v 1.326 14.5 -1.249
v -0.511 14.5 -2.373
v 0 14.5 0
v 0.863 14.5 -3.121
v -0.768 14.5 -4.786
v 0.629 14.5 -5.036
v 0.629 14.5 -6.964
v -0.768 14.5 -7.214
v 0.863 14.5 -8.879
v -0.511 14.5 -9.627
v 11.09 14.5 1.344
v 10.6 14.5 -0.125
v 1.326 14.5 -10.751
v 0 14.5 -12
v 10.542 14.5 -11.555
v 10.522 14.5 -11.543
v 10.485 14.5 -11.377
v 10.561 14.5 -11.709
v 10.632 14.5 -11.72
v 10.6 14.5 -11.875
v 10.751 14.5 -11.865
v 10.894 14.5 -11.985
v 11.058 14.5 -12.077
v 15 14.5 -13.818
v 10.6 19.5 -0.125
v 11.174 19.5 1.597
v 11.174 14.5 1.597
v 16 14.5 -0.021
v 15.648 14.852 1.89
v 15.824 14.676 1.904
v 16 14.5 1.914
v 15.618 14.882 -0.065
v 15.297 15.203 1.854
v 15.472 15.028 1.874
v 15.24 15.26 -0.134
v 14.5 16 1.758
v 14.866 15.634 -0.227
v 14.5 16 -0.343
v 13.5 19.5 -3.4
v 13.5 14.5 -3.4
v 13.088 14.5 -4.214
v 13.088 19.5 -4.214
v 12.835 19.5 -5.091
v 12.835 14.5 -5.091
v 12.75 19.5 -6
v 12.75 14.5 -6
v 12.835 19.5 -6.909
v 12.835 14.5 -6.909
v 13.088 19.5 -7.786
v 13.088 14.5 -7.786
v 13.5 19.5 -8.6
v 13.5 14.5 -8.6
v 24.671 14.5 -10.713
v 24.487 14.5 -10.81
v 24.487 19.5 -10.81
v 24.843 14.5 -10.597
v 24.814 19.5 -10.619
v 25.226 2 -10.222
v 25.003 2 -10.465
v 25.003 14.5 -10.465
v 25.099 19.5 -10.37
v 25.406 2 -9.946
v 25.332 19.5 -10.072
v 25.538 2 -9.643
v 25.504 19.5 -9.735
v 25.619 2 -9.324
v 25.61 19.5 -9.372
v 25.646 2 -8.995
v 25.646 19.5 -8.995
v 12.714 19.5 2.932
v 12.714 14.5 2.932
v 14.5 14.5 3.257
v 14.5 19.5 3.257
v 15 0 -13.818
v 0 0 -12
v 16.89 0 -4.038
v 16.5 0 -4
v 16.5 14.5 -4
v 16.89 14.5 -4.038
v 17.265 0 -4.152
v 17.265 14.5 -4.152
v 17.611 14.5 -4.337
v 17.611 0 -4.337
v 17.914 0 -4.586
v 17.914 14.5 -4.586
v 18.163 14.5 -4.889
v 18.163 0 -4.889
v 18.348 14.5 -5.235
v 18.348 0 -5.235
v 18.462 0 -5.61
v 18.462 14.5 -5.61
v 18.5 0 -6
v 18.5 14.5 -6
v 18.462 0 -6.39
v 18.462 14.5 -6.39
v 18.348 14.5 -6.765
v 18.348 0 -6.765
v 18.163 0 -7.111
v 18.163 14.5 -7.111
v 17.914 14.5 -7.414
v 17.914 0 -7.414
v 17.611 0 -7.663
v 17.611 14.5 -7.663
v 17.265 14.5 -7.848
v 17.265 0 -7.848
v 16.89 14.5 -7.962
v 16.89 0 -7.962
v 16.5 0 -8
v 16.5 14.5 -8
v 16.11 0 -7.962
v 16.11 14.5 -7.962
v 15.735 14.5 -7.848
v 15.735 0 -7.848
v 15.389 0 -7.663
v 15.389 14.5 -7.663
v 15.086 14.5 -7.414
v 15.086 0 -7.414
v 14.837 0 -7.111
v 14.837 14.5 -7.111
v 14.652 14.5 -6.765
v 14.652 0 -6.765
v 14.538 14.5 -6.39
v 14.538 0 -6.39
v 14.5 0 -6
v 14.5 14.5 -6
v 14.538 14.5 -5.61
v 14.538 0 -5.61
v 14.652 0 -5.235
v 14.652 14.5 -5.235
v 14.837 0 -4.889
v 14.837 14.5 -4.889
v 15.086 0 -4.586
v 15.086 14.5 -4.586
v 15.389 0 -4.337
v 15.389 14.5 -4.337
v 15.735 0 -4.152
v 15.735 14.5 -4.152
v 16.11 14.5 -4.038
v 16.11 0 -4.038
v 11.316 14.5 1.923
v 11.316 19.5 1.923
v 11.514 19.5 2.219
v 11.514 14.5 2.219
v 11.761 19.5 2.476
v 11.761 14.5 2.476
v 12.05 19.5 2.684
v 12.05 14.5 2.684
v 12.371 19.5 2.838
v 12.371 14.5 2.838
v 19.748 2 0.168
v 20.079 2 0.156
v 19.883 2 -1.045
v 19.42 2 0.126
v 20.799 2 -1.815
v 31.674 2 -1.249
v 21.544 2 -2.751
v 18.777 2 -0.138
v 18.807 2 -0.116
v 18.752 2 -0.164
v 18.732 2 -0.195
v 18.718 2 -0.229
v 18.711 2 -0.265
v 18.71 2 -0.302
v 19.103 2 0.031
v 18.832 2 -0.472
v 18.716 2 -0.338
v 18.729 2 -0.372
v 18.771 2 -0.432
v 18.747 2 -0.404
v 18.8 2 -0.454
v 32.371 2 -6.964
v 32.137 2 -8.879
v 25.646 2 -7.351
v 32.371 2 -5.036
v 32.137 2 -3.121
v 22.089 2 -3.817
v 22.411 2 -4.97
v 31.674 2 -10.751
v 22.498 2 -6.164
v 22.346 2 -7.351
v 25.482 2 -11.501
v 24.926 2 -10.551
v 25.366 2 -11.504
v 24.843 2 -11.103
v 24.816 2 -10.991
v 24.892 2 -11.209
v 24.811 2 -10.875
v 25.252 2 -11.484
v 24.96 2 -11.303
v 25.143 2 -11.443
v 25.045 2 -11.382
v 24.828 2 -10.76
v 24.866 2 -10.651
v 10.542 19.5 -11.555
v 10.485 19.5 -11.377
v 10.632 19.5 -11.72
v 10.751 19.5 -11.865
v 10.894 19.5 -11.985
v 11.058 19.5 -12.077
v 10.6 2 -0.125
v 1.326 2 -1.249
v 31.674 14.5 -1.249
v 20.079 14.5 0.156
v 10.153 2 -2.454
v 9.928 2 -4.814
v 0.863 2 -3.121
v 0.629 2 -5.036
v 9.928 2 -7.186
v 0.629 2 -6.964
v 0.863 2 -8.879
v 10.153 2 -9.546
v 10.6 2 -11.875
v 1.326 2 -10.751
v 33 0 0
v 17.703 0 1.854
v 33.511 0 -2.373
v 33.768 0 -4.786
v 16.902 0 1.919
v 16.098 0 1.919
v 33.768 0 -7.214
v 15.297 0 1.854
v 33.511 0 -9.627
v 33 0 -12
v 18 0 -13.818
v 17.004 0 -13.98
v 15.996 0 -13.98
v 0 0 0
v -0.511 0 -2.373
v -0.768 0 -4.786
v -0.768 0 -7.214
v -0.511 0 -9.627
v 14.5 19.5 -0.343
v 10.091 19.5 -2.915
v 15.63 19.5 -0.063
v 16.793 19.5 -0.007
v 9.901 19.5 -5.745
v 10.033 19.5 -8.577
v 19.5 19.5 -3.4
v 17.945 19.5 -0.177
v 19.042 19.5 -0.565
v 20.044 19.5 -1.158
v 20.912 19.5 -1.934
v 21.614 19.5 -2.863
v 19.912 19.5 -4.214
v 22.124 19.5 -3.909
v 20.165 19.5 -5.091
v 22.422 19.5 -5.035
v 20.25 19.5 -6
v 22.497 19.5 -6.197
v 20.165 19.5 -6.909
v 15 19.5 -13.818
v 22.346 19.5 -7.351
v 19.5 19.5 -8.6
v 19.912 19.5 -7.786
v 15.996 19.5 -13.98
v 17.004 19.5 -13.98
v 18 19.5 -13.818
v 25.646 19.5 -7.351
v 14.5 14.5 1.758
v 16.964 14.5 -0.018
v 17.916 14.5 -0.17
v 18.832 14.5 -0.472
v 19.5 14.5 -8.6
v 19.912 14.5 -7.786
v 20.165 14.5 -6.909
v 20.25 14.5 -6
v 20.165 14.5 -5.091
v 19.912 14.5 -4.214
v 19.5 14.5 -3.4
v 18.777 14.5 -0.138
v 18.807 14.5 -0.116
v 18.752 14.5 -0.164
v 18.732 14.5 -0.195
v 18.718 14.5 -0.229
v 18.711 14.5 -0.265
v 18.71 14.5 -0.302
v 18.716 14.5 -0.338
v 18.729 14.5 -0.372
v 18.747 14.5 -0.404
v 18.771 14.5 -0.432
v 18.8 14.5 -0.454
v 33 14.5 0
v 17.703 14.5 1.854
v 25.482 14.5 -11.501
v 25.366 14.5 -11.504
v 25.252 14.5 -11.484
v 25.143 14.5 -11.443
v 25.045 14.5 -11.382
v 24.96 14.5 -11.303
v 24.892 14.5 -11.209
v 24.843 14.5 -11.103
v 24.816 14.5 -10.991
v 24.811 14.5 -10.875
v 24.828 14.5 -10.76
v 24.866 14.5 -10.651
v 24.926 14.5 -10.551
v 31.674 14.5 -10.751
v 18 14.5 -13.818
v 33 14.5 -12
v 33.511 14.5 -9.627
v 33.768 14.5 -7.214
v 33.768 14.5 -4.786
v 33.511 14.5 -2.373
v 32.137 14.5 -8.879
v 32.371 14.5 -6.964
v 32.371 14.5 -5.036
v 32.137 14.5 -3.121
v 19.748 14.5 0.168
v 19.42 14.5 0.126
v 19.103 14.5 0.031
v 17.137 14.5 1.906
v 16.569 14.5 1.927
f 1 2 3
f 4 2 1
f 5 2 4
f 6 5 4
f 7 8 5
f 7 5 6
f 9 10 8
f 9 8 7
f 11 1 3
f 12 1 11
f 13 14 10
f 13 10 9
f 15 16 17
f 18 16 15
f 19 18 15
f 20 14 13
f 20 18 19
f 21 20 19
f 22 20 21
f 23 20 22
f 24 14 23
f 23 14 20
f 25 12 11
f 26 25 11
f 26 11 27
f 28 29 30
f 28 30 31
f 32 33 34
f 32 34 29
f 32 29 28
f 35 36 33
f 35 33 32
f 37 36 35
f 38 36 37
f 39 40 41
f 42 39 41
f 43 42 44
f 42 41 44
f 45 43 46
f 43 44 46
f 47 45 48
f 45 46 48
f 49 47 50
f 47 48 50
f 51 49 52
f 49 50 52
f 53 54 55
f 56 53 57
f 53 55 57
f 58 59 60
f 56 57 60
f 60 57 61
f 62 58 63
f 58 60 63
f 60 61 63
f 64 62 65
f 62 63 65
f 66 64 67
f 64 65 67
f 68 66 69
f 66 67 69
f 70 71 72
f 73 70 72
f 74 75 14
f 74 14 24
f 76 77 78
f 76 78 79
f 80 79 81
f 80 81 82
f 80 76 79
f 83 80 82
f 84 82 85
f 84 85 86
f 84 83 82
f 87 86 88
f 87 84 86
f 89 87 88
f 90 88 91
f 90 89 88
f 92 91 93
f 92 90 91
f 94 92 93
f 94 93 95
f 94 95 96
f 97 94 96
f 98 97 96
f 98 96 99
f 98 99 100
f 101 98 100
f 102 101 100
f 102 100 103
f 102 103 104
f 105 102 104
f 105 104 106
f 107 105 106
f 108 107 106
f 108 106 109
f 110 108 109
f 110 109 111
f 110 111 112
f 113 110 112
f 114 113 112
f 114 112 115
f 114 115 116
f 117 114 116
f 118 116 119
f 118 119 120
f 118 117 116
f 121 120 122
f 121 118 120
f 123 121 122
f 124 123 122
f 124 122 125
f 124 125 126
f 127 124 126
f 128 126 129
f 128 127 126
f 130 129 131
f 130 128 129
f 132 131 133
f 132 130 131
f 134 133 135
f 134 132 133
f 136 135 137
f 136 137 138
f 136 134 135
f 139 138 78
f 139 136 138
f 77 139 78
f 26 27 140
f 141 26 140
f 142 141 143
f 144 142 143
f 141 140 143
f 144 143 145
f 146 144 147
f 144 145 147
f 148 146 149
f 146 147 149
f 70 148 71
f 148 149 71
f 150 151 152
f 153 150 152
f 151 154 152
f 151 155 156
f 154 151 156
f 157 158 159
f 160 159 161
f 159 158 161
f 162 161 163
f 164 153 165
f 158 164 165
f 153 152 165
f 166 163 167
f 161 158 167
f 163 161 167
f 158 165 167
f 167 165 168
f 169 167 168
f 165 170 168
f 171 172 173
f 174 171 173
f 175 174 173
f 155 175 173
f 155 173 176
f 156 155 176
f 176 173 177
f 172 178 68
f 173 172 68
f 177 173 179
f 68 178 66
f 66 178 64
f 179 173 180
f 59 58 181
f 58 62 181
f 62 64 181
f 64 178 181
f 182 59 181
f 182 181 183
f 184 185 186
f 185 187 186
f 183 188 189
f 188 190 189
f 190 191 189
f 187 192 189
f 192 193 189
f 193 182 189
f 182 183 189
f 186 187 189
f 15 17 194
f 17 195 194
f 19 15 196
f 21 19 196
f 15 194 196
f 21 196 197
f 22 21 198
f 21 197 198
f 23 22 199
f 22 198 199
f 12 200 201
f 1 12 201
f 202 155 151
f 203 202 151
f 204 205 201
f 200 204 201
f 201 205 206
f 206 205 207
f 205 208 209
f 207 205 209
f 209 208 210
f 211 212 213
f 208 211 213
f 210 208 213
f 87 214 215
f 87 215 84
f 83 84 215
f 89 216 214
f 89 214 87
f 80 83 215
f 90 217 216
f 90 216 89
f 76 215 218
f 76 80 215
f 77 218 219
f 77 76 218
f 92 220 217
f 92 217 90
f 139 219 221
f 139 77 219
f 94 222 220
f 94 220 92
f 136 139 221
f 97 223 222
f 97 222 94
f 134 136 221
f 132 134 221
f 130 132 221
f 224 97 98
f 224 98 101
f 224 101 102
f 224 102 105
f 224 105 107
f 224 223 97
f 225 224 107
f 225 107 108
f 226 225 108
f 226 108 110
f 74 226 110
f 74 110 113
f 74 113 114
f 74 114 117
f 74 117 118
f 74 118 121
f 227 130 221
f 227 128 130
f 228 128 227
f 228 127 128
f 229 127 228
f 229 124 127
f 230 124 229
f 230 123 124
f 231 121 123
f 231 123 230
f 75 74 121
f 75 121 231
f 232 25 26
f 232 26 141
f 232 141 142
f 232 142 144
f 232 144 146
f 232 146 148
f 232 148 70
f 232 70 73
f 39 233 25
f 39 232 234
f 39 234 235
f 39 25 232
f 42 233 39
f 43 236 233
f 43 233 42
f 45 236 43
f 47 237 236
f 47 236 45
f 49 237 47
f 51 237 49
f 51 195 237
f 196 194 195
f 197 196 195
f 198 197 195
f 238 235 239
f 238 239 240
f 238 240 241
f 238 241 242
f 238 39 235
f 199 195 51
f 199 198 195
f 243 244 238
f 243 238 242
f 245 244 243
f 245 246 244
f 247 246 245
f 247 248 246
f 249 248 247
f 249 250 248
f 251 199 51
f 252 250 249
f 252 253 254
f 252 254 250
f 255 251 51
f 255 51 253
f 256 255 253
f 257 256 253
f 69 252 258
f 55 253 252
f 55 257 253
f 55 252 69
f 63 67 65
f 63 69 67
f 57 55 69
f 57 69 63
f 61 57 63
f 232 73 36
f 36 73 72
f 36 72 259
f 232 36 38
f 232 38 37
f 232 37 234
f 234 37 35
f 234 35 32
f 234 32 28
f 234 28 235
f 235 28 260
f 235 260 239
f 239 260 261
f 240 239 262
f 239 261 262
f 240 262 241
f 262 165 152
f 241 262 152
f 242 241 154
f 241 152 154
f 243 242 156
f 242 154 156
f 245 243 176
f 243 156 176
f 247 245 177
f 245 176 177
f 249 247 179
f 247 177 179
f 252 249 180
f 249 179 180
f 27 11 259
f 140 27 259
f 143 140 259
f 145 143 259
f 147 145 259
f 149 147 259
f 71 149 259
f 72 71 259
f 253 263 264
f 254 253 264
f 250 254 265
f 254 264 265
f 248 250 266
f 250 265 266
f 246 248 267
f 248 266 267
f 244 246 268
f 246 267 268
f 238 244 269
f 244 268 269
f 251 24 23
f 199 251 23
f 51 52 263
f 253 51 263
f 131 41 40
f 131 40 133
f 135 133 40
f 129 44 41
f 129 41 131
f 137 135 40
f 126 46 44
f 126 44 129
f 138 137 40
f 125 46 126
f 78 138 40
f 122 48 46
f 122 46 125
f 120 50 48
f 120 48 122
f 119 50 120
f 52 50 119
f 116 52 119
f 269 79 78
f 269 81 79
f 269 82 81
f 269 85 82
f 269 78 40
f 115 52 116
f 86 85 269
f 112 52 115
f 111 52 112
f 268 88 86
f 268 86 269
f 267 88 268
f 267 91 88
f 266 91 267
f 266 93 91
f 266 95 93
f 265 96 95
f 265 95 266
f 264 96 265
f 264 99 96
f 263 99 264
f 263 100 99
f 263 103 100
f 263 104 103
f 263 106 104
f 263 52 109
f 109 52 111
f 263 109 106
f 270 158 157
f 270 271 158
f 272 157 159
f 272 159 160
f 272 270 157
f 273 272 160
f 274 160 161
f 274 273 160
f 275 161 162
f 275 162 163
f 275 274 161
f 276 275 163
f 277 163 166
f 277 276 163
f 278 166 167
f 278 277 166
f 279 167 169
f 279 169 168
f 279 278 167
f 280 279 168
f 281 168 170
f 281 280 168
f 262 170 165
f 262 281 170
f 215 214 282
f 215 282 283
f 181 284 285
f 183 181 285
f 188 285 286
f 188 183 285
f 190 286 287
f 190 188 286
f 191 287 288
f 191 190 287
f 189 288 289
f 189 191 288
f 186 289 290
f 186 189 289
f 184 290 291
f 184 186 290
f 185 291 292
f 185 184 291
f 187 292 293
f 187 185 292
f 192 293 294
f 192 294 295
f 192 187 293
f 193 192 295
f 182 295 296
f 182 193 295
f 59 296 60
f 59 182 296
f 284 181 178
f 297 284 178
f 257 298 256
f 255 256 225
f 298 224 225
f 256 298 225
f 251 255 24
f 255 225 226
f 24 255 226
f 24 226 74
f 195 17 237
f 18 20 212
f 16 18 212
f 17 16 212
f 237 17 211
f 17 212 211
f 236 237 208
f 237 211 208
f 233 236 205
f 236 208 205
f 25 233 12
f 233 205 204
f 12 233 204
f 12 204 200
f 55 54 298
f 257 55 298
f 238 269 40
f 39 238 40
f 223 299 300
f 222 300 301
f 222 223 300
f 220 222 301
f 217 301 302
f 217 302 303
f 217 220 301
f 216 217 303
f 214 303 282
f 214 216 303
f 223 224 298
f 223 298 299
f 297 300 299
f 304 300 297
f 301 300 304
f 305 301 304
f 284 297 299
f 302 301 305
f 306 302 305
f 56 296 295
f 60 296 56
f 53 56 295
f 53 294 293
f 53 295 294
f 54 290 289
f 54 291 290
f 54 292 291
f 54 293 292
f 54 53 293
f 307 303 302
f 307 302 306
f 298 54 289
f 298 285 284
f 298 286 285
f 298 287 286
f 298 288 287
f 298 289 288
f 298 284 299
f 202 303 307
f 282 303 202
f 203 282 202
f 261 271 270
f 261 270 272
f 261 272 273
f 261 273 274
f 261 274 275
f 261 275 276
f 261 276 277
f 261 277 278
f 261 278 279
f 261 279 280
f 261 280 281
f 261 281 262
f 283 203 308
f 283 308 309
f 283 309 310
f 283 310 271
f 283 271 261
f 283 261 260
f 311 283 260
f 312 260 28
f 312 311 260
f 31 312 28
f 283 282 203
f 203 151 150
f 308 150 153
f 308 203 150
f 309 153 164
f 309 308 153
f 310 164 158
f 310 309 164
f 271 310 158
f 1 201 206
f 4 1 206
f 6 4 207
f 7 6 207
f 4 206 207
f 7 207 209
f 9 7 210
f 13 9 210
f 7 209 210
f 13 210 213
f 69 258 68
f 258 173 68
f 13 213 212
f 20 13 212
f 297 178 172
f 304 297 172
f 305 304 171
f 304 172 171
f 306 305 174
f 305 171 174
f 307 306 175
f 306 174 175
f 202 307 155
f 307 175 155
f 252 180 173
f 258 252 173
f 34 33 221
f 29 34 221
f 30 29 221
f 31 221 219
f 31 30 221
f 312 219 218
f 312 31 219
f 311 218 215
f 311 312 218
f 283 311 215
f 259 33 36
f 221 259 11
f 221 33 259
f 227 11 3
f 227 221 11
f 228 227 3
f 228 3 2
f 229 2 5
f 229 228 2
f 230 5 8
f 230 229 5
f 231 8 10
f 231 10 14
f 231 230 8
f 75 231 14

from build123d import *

# Parameters (mm, degrees)
BOSS_EXTRUDE1_DEPTH = 14.5
SKETCH1_3_R         = 1.9999999999999996
BOSS_EXTRUDE2_DEPTH = 2
SKETCH2_R           = 1.9999999999999996
BOSS_EXTRUDE3_DEPTH = 12.5
BOSS_EXTRUDE4_START = -2
SKETCH2_2_R         = 1.9999999999999996
BOSS_EXTRUDE4_DEPTH = 2
BOSS_EXTRUDE5_DEPTH = 5
CHAMFER1_SIZE       = 1.5
FILLET3_R           = 2
FILLET1_R           = 0.6
FILLET4_R           = 2
FILLET5_R           = 0.2
FILLET6_R           = 1
FILLET7_R           = 10


with BuildPart() as part:
    # Sketch1 → Boss-Extrude1 (new body)
    with BuildSketch(Plane(origin=(0, 0, 0), x_dir=(1, 0, 0), z_dir=(0, 1, 0))):
        with BuildLine():
            ThreePointArc((33, 12), (33.8, 6), (33, 0))
            Line((33, 0), (16.499999999999837, -2.00000000000002))
            Line((16.499999999999837, -2.00000000000002), (0, 0))
            ThreePointArc((0, 0), (-0.7999999999999936, 5.999999999999997), (0, 12))
            Line((0, 12), (16.499999999999837, 13.99999999999998))
            Line((16.499999999999837, 13.99999999999998), (33, 12))
        make_face()
        with BuildLine():
            Line((16.49999999999997, 12.589752836725182), (31.673748690170243, 10.750510571250008))
            ThreePointArc((31.673748690170243, 10.750510571250008), (32.39999999999999, 5.999999999999953), (31.673748690170243, 1.2494894287498812))
            Line((31.673748690170243, 1.2494894287498812), (16.49999999999984, -0.5897528367253209))
            Line((16.49999999999984, -0.5897528367253209), (1.3262513098297308, 1.2494894287498826))
            ThreePointArc((1.3262513098297308, 1.2494894287498826), (0.5999999999999286, 5.999999999999944), (1.3262513098297308, 10.750510571250004))
            Line((1.3262513098297308, 10.750510571250004), (16.49999999999997, 12.589752836725182))
        make_face(mode=Mode.SUBTRACT)
    extrude(amount=BOSS_EXTRUDE1_DEPTH)

    # Sketch1<3> → Boss-Extrude2 (add)
    with BuildSketch(Plane(origin=(0, 0, 0), x_dir=(1, 0, 0), z_dir=(0, 1, 0))):
        with BuildLine():
            ThreePointArc((31.673748690170243, 10.750510571250008), (32.39999999999999, 5.999999999999953), (31.673748690170243, 1.2494894287498812))
            Line((31.673748690170243, 1.2494894287498812), (16.49999999999984, -0.5897528367253209))
            Line((16.49999999999984, -0.5897528367253209), (1.3262513098297308, 1.2494894287498826))
            ThreePointArc((1.3262513098297308, 1.2494894287498826), (0.5999999999999286, 5.999999999999944), (1.3262513098297308, 10.750510571250004))
            Line((1.3262513098297308, 10.750510571250004), (16.49999999999997, 12.589752836725182))
            Line((16.49999999999997, 12.589752836725182), (31.673748690170243, 10.750510571250008))
        make_face()
        with Locations(Location((16.499999999999837, 5.999999999999998, 0), (0, 0, 270))):
            Circle(SKETCH1_3_R, mode=Mode.SUBTRACT)
    extrude(amount=BOSS_EXTRUDE2_DEPTH)

    # Sketch2 → Boss-Extrude3 (add)
    with BuildSketch(Plane(origin=(0, 2, 0), x_dir=(1, 0, 0), z_dir=(0, 1, 0))):
        with BuildLine():
            Line((22.34588668015035, 7.351150962268389), (25.64588668015035, 7.351150962268389))
            Line((25.64588668015035, 7.351150962268389), (25.64588668015035, 10.27237722905159))
            Line((25.64588668015035, 10.27237722905159), (17.999999999999844, 13.818181818181802))
            ThreePointArc((17.999999999999844, 13.818181818181802), (16.499999999999844, 13.999999999999986), (14.999999999999844, 13.8181818181818))
            Line((14.999999999999844, 13.8181818181818), (10.599999999999836, 11.874601321573653))
            ThreePointArc((10.599999999999836, 11.874601321573653), (9.899999999999839, 5.999999999999933), (10.599999999999838, 0.12539867842620983))
            Line((10.599999999999838, 0.12539867842620983), (14.499999999999885, -1.7575757575757784))
            Line((14.499999999999885, -1.7575757575757784), (18.499999999999837, -1.7575757575757784))
            Line((18.499999999999837, -1.7575757575757784), (18.499999999999837, 0.34314575050761753))
            ThreePointArc((18.499999999999837, 0.34314575050761753), (21.75999227294638, 3.1133962363111447), (22.34588668015035, 7.351150962268389))
        make_face()
        with Locations(Location((16.499999999999837, 5.999999999999998, 0), (0, 0, 270))):
            Circle(SKETCH2_R, mode=Mode.SUBTRACT)
    extrude(amount=BOSS_EXTRUDE3_DEPTH)

    # Sketch2<2> → Boss-Extrude4 (add)
    with BuildSketch(Plane(origin=(0, 2, 0), x_dir=(1, 0, 0), z_dir=(0, 1, 0)).offset(BOSS_EXTRUDE4_START)):
        with BuildLine():
            Line((22.34588668015035, 7.351150962268389), (25.64588668015035, 7.351150962268389))
            Line((25.64588668015035, 7.351150962268389), (25.64588668015035, 10.27237722905159))
            Line((25.64588668015035, 10.27237722905159), (17.999999999999844, 13.818181818181802))
            ThreePointArc((17.999999999999844, 13.818181818181802), (16.499999999999844, 13.999999999999986), (14.999999999999844, 13.8181818181818))
            Line((14.999999999999844, 13.8181818181818), (10.599999999999836, 11.874601321573653))
            ThreePointArc((10.599999999999836, 11.874601321573653), (9.899999999999839, 5.999999999999933), (10.599999999999838, 0.12539867842620983))
            Line((10.599999999999838, 0.12539867842620983), (14.499999999999885, -1.7575757575757784))
            Line((14.499999999999885, -1.7575757575757784), (18.499999999999837, -1.7575757575757784))
            Line((18.499999999999837, -1.7575757575757784), (18.499999999999837, 0.34314575050761753))
            ThreePointArc((18.499999999999837, 0.34314575050761753), (21.75999227294638, 3.1133962363111447), (22.34588668015035, 7.351150962268389))
        make_face()
        with Locations(Location((16.499999999999837, 5.999999999999998, 0), (0, 0, 270))):
            Circle(SKETCH2_2_R, mode=Mode.SUBTRACT)
    extrude(amount=BOSS_EXTRUDE4_DEPTH)

    # Sketch3 → Boss-Extrude5 (add)
    with BuildSketch(Plane(origin=(0, 14.5, 0), x_dir=(1, 0, 0), z_dir=(0, 1, 0))):
        with BuildLine():
            Line((22.34588668015035, 7.351150962268389), (25.64588668015035, 7.351150962268389))
            Line((25.64588668015035, 7.351150962268389), (25.64588668015035, 10.27237722905159))
            Line((25.64588668015035, 10.27237722905159), (17.999999999999826, 13.81818181818181))
            ThreePointArc((17.999999999999826, 13.81818181818181), (16.499999999999833, 13.99999999999999), (14.999999999999844, 13.818181818181802))
            Line((14.999999999999844, 13.818181818181802), (10.599999999999836, 11.874601321573653))
            ThreePointArc((10.599999999999836, 11.874601321573653), (9.899999999999842, 5.999999999999933), (10.599999999999842, 0.12539867842621155))
            Line((10.599999999999842, 0.12539867842621155), (11.173814866283609, -1.5968518966374832))
            ThreePointArc((11.173814866283609, -1.5968518966374832), (11.760910789091948, -2.4756088583346414), (12.713890329463082, -2.932473626010398))
            Line((12.713890329463082, -2.932473626010398), (14.49999999999984, -3.2568542494923824))
            Line((14.49999999999984, -3.2568542494923824), (14.49999999999984, 0.3431457505076174))
            ThreePointArc((14.49999999999984, 0.3431457505076174), (20.496967019022676, 1.5251531144804868), (22.34588668015035, 7.351150962268389))
        make_face()
        with BuildLine():
            Line((13.499999999999838, 8.599999999999934), (19.499999999999837, 8.599999999999934))
            ThreePointArc((19.499999999999837, 8.599999999999934), (20.249999999999837, 5.999999999999933), (19.499999999999837, 3.3999999999999324))
            Line((19.499999999999837, 3.3999999999999324), (13.499999999999838, 3.3999999999999324))
            ThreePointArc((13.499999999999838, 3.3999999999999324), (12.749999999999837, 5.999999999999932), (13.499999999999838, 8.599999999999934))
        make_face(mode=Mode.SUBTRACT)
    extrude(amount=BOSS_EXTRUDE5_DEPTH)

    # Chamfer1
    chamfer1_edges = [part.edges().sort_by_distance(p)[0] for p in [
        (14.49999999999984, 14.5, 0.7072150035340781),
    ]]
    chamfer(chamfer1_edges, length=CHAMFER1_SIZE)

    # Fillet3
    fillet3_edges = [part.edges().sort_by_distance(p)[0] for p in [
        (25.64588668015035, 10.75, -10.27237722905159),
    ]]
    fillet(fillet3_edges, radius=FILLET3_R)

    # Fillet1
    # the kernel refuses this fillet: 0.6 mm, written as the material it adds along each edge
    with BuildSketch(Plane(origin=(22.11701590469639, 2, -11.90890242403471), x_dir=(0.8942491782496095, 0, 0.44756944399712767), z_dir=(0, 1, 0))) as fillet1_piece_1:
        with BuildLine():
            CenterArc((3.393748585617257, 0.5763680275818249), FILLET1_R, 109.67662149320171, 144.1891632768265)
            Line((3.1917219374131016, 1.1413328348179872), (3.16141794018248, 1.2260775559034116))
            Line((3.16141794018248, 1.2260775559034116), (-0.03030399723062558, 0.08474472108542427))
            Line((-0.03030399723062558, 0.08474472108542427), (0.00268281172049191, -0.08996000512045559))
            ThreePointArc((0.00268281172049191, -0.08996000512045559), (2.614303647054314, -0.01207553882752912), (3.2020056235731444, -0.08645520413727262))
            Line((3.2020056235731444, -0.08645520413727262), (3.227015575144115, 1e-16))
        make_face()
    extrude(amount=12.5)

    # Fillet4
    # the kernel refuses this fillet: 2 mm, written as the material it adds along each edge
    with BuildSketch(Plane(origin=(18.499999999999837, 14.5, 0.34732859430107876), x_dir=(0.9927337820337083, 0, -0.12033136751923736), z_dir=(0, -1, 0))) as fillet4_piece_1:
        with BuildLine():
            CenterArc((1.5903936692052363, -2.0000000000000004), FILLET4_R, 89.99999999999994, 48.90789553913825)
            Line((0.08308572214778008, -0.6854572077191857), (0, 0))
            Line((0, 0), (1.5903936692052383, -1e-17))
        make_face()
    extrude(amount=12.5)

    # Fillet5
    fillet5_edges = [part.edges().sort_by_distance(p)[0] for p in [
        (18.499999999999837, 8.25, -0.34314575050761803),
    ]]
    fillet(fillet5_edges, radius=FILLET5_R)

    # Fillet6
    fillet6_edges = [part.edges().sort_by_distance(p)[0] for p in [
        (10.599999999999834, 17, -11.874601321573653),
    ]]
    fillet(fillet6_edges, radius=FILLET6_R)

    # Fillet7
    fillet7_edges = [part.edges().sort_by_distance(p)[0] for p in [
        (16.499999999999837, 7.25, 2.00000000000002),
    ]]
    fillet(fillet7_edges, radius=FILLET7_R)


solid = part.part
